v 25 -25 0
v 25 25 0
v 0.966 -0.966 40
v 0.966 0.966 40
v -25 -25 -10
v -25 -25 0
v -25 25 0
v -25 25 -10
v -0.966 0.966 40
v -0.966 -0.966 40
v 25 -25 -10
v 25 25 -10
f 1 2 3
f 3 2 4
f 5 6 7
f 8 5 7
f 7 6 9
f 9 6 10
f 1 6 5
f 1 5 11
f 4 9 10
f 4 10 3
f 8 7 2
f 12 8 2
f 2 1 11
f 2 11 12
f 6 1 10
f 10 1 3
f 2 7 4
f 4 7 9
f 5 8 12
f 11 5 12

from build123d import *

# Parameters (mm, degrees)
CELLULE_W          = 50
CELLULE_H          = 50
BOSS_EXTRU_1_DEPTH = 10
ESQUISSE2_W        = 50
ESQUISSE2_H        = 50
BOSS_EXTRU_2_DEPTH = 40
BOSS_EXTRU_2_TAPER = 31


with BuildPart() as part:
    # cellule → Boss.-Extru.1 (new body)
    with BuildSketch(Plane.XY):
        Rectangle(CELLULE_W, CELLULE_H)
    extrude(amount=-BOSS_EXTRU_1_DEPTH)

    # Esquisse2 → Boss.-Extru.2 (add)
    with BuildSketch(Plane.XY):
        Rectangle(ESQUISSE2_W, ESQUISSE2_H)
    extrude(amount=BOSS_EXTRU_2_DEPTH, taper=BOSS_EXTRU_2_TAPER)


solid = part.part
